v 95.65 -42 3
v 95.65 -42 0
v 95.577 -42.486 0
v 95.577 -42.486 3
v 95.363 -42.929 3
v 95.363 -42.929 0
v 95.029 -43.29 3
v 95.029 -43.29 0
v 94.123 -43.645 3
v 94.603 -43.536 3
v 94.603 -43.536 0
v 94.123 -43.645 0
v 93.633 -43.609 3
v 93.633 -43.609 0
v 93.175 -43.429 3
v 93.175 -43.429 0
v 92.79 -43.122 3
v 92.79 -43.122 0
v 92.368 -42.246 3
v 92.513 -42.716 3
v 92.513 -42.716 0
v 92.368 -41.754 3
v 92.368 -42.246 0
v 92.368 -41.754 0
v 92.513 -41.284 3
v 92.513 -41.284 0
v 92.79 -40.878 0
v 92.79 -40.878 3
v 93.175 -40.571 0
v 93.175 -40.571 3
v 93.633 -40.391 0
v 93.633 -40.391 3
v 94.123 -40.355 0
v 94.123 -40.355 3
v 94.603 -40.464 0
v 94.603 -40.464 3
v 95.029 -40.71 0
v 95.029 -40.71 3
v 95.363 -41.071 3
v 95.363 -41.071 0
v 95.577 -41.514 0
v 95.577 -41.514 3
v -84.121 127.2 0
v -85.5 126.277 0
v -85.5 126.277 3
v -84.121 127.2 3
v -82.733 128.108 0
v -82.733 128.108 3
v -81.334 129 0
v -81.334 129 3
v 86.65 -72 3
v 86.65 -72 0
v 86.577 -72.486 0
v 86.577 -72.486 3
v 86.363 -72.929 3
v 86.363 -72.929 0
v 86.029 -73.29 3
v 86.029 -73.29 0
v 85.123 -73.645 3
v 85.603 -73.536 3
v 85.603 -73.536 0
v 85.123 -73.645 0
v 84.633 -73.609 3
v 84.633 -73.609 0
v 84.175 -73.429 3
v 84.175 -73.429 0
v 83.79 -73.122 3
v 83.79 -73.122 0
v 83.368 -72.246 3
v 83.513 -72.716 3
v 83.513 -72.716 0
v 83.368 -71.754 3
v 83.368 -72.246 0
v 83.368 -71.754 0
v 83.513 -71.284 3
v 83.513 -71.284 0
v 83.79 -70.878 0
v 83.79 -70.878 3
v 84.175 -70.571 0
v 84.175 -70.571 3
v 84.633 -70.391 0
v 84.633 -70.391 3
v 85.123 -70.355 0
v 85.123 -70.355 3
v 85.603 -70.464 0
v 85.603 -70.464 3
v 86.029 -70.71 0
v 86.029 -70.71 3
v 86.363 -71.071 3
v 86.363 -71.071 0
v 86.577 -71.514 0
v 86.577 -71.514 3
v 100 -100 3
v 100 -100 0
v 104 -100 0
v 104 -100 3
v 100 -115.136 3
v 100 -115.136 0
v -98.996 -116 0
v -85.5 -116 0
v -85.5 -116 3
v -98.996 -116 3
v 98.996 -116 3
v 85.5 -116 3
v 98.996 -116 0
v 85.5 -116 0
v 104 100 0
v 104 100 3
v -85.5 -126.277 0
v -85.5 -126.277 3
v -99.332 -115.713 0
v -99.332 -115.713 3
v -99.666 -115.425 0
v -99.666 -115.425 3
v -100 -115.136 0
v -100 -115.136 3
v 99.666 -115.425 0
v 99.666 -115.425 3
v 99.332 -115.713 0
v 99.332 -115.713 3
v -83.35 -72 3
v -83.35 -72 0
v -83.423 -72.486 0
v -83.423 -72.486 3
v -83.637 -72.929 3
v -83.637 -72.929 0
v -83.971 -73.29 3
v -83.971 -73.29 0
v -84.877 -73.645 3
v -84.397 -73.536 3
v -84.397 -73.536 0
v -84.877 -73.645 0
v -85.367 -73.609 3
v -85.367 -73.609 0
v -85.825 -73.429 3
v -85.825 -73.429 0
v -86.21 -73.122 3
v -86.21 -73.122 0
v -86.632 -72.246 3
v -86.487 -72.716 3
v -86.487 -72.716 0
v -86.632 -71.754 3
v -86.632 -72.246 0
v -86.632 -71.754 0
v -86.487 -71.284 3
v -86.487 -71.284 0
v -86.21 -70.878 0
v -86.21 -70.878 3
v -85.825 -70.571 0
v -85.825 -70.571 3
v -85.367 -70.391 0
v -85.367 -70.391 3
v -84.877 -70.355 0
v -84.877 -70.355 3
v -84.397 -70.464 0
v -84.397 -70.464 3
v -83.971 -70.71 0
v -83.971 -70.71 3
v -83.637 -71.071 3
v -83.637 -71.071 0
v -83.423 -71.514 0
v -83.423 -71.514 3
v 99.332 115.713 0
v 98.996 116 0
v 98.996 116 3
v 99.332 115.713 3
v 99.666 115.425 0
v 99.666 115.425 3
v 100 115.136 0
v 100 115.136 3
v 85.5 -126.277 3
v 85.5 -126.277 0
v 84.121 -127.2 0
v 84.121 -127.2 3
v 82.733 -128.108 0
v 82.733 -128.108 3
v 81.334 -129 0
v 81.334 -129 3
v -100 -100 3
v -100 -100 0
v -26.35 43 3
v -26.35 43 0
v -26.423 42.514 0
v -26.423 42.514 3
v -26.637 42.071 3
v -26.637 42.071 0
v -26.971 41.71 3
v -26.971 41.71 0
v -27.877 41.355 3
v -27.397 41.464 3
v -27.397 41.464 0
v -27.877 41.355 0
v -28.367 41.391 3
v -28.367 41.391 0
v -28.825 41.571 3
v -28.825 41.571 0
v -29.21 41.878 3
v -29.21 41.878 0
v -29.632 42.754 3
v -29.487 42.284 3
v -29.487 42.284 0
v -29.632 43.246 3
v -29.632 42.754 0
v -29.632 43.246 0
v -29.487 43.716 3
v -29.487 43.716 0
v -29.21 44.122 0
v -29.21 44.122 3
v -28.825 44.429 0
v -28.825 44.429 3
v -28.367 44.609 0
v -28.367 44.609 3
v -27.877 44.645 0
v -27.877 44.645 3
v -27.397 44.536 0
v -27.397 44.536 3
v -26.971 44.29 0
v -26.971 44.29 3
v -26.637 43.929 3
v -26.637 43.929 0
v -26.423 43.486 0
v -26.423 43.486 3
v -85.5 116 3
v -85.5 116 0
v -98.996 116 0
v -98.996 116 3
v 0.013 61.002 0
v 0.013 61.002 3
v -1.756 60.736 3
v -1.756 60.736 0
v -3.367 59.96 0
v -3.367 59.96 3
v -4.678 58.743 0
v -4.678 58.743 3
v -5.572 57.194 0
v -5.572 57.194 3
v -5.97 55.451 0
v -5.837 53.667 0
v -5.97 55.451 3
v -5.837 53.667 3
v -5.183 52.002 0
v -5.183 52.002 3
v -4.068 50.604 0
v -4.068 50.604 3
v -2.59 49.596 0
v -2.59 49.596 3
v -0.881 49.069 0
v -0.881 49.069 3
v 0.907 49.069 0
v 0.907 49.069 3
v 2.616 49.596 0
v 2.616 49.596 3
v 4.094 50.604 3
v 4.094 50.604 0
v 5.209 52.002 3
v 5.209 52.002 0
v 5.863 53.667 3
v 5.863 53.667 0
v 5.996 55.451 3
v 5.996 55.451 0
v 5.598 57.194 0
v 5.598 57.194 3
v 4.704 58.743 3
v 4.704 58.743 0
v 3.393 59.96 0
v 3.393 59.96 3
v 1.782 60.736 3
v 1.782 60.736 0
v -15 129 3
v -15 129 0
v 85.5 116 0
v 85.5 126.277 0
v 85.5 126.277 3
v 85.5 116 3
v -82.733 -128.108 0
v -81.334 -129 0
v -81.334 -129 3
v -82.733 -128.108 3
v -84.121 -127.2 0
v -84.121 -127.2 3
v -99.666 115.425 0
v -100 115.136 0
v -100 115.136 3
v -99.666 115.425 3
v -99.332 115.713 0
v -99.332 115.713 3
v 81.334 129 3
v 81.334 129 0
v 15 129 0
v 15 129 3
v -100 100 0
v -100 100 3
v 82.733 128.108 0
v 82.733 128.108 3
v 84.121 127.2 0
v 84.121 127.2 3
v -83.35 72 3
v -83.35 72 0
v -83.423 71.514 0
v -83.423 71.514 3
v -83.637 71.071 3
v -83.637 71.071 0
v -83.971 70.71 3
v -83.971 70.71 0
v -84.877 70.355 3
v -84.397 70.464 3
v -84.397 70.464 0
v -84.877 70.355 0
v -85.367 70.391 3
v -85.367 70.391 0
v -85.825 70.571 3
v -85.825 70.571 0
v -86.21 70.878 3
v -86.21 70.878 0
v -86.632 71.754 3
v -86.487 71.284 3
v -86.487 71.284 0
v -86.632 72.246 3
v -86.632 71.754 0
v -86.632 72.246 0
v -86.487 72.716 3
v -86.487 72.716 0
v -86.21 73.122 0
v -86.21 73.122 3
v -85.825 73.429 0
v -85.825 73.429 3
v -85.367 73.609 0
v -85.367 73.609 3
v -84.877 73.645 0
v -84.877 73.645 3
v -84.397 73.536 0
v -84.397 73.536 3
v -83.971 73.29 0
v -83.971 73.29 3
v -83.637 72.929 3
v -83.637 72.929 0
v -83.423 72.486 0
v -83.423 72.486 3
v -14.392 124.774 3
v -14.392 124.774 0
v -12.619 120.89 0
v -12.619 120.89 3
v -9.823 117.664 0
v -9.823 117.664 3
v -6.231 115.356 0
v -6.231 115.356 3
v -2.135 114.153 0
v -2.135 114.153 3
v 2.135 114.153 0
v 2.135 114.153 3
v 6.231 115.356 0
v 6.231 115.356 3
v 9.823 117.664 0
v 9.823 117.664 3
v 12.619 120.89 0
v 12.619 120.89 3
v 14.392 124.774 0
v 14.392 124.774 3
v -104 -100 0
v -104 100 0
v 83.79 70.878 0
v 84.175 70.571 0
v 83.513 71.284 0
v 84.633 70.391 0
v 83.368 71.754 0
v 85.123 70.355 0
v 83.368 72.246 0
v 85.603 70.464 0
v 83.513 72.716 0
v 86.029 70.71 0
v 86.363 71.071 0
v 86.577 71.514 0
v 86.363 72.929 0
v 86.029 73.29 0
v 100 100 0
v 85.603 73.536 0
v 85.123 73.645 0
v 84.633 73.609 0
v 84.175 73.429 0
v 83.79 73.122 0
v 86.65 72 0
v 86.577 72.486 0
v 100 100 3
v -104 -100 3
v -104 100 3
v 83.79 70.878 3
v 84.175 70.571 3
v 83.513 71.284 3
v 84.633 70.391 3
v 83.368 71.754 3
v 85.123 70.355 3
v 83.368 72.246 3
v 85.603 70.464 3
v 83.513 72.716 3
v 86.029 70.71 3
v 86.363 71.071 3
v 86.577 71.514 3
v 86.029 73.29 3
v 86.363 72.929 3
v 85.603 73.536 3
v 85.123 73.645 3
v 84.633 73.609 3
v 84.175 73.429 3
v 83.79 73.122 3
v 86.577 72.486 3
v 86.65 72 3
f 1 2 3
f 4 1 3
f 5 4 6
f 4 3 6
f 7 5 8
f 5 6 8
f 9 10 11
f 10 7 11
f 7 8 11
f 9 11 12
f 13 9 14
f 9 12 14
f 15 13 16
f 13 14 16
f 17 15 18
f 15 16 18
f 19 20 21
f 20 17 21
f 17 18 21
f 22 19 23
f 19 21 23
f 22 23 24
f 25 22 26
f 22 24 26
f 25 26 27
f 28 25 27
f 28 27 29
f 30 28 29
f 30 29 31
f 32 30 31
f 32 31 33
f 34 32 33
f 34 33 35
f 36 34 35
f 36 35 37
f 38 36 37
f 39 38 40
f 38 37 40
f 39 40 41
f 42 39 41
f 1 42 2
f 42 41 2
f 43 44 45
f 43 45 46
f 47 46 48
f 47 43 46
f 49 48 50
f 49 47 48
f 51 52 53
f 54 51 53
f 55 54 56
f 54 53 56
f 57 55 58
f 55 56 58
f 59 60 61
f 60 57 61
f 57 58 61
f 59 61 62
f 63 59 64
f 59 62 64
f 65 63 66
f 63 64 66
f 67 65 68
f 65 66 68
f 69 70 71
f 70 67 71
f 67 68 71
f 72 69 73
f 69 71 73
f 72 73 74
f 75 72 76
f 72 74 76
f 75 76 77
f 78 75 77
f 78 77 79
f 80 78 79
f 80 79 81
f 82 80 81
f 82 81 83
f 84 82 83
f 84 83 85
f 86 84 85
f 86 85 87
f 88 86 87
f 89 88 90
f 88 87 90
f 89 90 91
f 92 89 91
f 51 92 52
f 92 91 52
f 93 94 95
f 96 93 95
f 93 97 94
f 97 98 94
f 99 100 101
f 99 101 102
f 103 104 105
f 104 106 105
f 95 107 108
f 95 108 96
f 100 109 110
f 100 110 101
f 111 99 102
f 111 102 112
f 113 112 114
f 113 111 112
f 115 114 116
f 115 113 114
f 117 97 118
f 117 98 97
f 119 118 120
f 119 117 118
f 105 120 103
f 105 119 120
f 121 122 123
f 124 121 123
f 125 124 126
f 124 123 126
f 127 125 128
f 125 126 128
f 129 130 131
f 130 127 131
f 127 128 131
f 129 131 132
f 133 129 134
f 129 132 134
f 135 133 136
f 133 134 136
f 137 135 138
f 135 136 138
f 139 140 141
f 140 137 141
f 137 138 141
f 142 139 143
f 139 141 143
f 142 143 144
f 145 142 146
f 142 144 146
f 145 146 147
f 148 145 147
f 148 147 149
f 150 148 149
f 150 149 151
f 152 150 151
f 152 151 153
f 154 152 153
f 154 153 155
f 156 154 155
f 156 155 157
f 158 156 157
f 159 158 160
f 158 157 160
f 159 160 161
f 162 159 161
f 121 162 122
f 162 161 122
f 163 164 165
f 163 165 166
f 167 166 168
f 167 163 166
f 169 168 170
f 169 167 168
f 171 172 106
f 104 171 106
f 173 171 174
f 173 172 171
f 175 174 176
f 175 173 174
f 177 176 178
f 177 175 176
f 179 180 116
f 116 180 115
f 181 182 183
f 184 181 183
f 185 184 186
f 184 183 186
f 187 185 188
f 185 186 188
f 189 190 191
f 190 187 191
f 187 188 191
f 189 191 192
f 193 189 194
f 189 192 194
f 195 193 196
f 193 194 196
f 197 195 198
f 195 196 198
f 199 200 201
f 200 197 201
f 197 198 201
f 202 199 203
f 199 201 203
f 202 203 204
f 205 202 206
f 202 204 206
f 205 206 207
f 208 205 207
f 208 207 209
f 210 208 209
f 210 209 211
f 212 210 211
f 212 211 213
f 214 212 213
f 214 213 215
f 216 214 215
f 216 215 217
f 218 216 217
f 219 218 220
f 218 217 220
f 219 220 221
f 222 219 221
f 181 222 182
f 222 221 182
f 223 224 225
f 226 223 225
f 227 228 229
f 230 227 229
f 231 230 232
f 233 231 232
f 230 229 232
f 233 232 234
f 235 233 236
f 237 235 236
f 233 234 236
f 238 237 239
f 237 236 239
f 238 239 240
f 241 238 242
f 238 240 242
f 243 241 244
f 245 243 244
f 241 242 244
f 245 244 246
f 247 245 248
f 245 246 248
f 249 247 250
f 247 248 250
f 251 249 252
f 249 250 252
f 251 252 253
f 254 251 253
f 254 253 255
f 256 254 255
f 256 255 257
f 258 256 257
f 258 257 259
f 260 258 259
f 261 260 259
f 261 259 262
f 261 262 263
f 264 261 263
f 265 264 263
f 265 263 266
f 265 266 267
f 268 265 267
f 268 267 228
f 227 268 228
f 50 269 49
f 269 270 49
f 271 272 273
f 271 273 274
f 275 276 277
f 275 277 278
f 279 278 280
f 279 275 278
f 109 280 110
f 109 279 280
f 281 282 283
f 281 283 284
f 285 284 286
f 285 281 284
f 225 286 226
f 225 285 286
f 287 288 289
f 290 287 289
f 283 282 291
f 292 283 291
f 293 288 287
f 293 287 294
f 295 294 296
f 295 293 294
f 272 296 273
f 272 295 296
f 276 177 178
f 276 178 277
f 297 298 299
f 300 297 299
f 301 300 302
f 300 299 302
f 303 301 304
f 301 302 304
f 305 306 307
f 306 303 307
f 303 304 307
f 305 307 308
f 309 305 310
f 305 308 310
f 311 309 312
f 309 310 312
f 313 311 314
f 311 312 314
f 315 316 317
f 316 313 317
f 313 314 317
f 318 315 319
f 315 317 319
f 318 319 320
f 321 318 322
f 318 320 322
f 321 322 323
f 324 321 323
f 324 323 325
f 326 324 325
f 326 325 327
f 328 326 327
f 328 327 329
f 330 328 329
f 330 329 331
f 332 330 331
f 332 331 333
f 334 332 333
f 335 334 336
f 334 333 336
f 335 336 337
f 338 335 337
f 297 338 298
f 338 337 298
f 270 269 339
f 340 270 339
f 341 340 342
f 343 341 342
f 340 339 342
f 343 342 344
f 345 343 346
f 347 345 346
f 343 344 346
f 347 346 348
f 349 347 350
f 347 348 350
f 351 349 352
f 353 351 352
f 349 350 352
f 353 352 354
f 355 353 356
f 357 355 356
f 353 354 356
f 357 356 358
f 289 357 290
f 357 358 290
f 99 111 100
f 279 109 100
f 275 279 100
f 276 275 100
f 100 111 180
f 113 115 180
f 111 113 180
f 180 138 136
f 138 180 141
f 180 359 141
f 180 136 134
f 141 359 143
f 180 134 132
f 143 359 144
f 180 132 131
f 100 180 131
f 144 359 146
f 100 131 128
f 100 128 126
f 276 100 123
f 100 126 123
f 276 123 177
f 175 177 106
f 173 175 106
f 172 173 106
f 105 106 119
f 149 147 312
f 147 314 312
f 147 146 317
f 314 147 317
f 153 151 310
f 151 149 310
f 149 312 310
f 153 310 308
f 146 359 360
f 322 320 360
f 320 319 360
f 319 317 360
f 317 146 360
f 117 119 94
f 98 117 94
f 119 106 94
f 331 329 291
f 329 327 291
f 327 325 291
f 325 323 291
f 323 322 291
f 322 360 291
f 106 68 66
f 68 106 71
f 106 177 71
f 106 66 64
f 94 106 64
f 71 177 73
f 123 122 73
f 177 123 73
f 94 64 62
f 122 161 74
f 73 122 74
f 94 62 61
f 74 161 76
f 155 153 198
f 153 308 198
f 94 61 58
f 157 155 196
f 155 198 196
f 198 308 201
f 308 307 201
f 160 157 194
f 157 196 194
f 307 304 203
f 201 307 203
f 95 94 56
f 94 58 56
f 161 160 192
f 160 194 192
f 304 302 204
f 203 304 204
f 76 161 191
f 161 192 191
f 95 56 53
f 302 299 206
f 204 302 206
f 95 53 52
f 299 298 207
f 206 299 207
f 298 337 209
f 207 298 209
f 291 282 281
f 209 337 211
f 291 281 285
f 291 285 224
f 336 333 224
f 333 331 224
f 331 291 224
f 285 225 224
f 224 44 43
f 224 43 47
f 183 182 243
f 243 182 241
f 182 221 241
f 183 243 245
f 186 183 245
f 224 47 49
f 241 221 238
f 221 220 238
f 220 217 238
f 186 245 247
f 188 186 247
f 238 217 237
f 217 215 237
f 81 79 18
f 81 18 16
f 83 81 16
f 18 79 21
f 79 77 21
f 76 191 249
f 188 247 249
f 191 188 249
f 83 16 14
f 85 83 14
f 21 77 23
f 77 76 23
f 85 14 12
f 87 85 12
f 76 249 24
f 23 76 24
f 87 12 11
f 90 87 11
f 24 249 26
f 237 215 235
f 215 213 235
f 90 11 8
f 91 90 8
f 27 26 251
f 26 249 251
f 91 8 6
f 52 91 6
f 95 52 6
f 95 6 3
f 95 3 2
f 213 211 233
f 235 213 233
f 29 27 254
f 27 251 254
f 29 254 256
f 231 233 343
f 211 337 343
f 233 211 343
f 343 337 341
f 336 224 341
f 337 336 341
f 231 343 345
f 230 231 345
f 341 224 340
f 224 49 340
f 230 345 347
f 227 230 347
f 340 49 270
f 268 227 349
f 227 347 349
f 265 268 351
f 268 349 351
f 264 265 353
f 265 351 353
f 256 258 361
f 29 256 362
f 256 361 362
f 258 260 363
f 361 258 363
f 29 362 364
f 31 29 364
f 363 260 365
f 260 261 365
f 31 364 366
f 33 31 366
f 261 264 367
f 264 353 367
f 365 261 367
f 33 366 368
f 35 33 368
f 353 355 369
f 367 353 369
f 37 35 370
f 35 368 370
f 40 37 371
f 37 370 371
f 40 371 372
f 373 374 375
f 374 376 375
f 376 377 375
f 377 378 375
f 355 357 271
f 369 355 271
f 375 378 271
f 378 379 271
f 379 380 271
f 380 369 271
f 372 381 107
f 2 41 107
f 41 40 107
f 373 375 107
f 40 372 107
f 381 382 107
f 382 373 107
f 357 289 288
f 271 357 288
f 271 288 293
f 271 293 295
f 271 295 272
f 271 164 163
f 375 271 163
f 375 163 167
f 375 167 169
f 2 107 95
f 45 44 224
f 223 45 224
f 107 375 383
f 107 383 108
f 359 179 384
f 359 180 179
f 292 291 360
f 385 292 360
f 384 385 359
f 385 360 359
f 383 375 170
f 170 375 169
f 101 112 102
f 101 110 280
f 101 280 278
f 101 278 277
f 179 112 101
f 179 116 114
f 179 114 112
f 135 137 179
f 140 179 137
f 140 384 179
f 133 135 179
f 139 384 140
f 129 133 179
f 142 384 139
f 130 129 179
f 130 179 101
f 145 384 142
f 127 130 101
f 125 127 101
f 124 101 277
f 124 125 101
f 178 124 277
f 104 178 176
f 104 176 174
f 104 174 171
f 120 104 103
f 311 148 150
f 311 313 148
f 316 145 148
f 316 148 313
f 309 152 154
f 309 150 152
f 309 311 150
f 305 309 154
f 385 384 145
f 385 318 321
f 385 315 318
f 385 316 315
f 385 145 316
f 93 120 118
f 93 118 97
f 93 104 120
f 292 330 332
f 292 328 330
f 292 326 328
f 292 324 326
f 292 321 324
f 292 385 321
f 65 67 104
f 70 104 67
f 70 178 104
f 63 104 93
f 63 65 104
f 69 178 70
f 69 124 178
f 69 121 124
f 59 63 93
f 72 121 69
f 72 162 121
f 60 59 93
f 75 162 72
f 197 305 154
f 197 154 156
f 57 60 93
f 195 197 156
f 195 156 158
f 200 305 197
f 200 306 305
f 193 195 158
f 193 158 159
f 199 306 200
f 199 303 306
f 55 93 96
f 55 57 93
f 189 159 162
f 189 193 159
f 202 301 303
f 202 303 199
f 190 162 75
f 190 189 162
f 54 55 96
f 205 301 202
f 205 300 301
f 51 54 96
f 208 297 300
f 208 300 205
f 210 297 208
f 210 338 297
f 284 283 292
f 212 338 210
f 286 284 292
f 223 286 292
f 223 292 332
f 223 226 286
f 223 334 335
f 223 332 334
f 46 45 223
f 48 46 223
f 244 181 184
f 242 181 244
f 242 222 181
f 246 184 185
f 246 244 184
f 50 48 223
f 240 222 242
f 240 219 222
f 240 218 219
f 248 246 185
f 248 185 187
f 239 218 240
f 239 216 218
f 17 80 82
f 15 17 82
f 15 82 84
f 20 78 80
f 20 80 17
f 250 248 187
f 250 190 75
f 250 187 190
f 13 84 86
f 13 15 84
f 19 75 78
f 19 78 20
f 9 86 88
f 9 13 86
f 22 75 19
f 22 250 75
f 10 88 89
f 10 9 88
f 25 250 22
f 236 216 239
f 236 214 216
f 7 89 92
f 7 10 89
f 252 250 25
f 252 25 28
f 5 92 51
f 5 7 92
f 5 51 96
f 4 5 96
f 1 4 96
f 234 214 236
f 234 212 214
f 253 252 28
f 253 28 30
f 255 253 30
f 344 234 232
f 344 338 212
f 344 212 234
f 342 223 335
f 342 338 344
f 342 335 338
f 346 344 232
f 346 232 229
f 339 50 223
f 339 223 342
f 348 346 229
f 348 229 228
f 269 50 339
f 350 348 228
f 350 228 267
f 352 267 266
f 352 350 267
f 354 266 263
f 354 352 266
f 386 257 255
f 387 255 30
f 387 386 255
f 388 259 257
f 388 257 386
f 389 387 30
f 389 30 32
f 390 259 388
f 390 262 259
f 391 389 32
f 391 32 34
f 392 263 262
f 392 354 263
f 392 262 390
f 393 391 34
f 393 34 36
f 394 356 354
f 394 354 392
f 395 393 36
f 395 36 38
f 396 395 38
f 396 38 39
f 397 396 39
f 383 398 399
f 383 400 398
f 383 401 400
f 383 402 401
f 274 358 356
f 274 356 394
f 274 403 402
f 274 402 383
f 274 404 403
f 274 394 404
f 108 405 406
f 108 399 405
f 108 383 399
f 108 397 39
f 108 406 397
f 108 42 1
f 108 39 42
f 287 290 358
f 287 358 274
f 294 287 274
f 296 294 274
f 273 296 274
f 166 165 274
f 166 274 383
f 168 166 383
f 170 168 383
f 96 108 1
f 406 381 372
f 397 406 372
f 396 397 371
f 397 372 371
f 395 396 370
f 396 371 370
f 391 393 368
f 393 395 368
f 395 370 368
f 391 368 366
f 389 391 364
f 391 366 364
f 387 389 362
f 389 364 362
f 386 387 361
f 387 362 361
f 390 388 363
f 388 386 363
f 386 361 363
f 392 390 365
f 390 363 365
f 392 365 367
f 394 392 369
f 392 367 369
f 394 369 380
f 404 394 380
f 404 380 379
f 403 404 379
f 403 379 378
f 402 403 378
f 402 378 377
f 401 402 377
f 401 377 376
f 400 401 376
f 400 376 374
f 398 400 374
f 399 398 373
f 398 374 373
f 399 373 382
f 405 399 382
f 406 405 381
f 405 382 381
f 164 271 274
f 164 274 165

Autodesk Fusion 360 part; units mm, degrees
sketch "Sketch1" plane through (0, 0, 0) normal (0, 0, 1) x (1, 0, 0)
  line L0 (100, 125) -> (-100, 125)
  line L1 (-100, 125) -> (-100, -125)
  line L2 (-100, -125) -> (100, -125)
  line L3 (100, -125) -> (100, 125)
  line L4 (100, 125) -> (-100, -125) construction
  line L5 (-100, 125) -> (100, -125) construction
  line L6 (-100, 125) -> (100, 125)
  line L7 (100, 125) -> (100, 129)
  line L8 (100, 129) -> (-100, 129)
  line L9 (-100, 129) -> (-100, 125)
  line L10 (-100, -125) -> (100, -125)
  line L11 (100, -125) -> (100, -129)
  line L12 (100, -129) -> (-100, -129)
  line L13 (-100, -129) -> (-100, -125)
  line L14 (100, 125) -> (104, 125)
  line L15 (104, 125) -> (104, -125)
  line L16 (104, -125) -> (100, -125)
  line L17 (100, -125) -> (100, 125)
  line L18 (-100, 125) -> (-104, 125)
  line L19 (-104, 125) -> (-104, -125)
  line L20 (-104, -125) -> (-100, -125)
  line L21 (-100, -125) -> (-100, 125)
  line L22 (-80, -53.8) -> (-80, 2.2) construction
  circle A0 centre (-80, -53.8) radius 1.65 construction
  circle A1 centre (-80, 2.2) radius 1.65 construction
  line L23 (-61.0622, -1) -> (-98.9378, -1) construction
  line L24 (-98.9378, -1) -> (-98.9378, -50.6) construction
  line L25 (-98.9378, -50.6) -> (-61.0622, -50.6) construction
  line L26 (-61.0622, -50.6) -> (-61.0622, -1) construction
  line L27 (-61.0622, -1) -> (-98.9378, -50.6) construction
  line L28 (-98.9378, -1) -> (-61.0622, -50.6) construction
  line L29 (-30.5, 49.5) -> (98.5, 49.5) construction
  line L30 (98.5, 49.5) -> (98.5, -47.5) construction
  line L31 (98.5, -47.5) -> (-30.5, -47.5) construction
  line L32 (-30.5, -47.5) -> (-30.5, 49.5) construction
  circle A2 centre (-28, 43) radius 1.65
  circle A3 centre (94, -42) radius 1.65
  line L33 (-100, 125) -> (-85.5, 125)
  line L34 (-85.5, 125) -> (-85.5, 116)
  line L35 (-85.5, 116) -> (-100, 116)
  line L36 (-100, 116) -> (-100, 125)
  line L37 (100, 125) -> (85.5, 125)
  line L38 (85.5, 125) -> (85.5, 116)
  line L39 (85.5, 116) -> (100, 116)
  line L40 (100, 116) -> (100, 125)
  line L41 (-100, -125) -> (-85.5, -125)
  line L42 (-85.5, -125) -> (-85.5, -116)
  line L43 (-85.5, -116) -> (-100, -116)
  line L44 (-100, -116) -> (-100, -125)
  line L45 (100, -125) -> (85.5, -125)
  line L46 (85.5, -125) -> (85.5, -116)
  line L47 (85.5, -116) -> (100, -116)
  line L48 (100, -116) -> (100, -125)
  line L49 (-100, 100) -> (-104, 100)
  line L50 (100, 100) -> (104, 100)
  line L51 (-100, -100) -> (-104, -100)
  line L52 (100, -100) -> (104, -100)
  line L53 (-85.5, 125) -> (-85.5, 129)
  line L54 (85.5, 125) -> (85.5, 129)
  line L55 (-85.5, -125) -> (-85.5, -129)
  line L56 (85.5, -125) -> (85.5, -129)
  line L57 (-115, -140) -> (-75, -140) construction
  line L58 (-75, -140) -> (-75, -87) construction
  line L59 (-75, -87) -> (-115, -87) construction
  line L60 (-115, -87) -> (-115, -140) construction
  line L61 (-63.3606, -140) -> (-21.3606, -140) construction
  line L62 (-21.3606, -140) -> (-21.3606, -53.8) construction
  line L63 (-21.3606, -53.8) -> (-63.3606, -53.8) construction
  line L64 (-63.3606, -53.8) -> (-63.3606, -140) construction
  line L65 (-100, 0) -> (-118.2487, 0) construction
  circle A4 centre (0, 0) radius 152.5
  circle A5 centre (-85, -72) radius 1.65
  line L66 (-85, -72) -> (85, -72) construction
  line L67 (85, -72) -> (85, 72) construction
  line L68 (85, 72) -> (-85, 72) construction
  line L69 (-85, 72) -> (-85, -72) construction
  circle A6 centre (85, 72) radius 1.65
  circle A7 centre (85, -72) radius 1.65
  circle A8 centre (-85, 72) radius 1.65
  point P0 (-80, -25.8)
  dimension "d1" = 200
  dimension "d2" = 250
  dimension "d3" = 4
  dimension "d4" = 4
  dimension "d5" = 4
  dimension "d6" = 4
  dimension "d7" = 20
  dimension "d8" = 56
  dimension "d10" = 3.3
  dimension "d11" = 37.8755
  dimension "d12" = 49.6
  dimension "d13" = 2.5
  dimension "d14" = 6.5
  dimension "d15" = 3.3
  dimension "d16" = 5.5
  dimension "d17" = 4.5
  dimension "d18" = 129
  dimension "d19" = 97
  dimension "d20" = 1.5
  dimension "d21" = 14.5
  dimension "d22" = 9
  dimension "d23" = 14.5
  dimension "d24" = 9
  dimension "d25" = 14.5
  dimension "d26" = 14.5
  dimension "d27" = 9
  dimension "d28" = 9
  dimension "d29" = 25
  dimension "d30" = 25
  dimension "d31" = 25
  dimension "d32" = 25
  dimension "d33" = 40
  dimension "d34" = 53
  dimension "d35" = 15
  dimension "d36" = 15
  dimension "d37" = 3.3
  dimension "d38" = 86.2
  dimension "d39" = 42
  dimension "d40" = 1
  dimension "d50" = 305
  dimension "d51" = 3.3
  dimension "d52" = 15
  dimension "d53" = 15
  dimension "d54" = 15
  dimension "d55" = 53
  dimension "d56" = 53
  dimension "d57" = 170
  dimension "d58" = 144
  dimension "d60" = 47.5
  dimension "d61" = 49.5
extrude "Extrude1" add sketch "Sketch1" along normal blind 3 contours L0 L1 L2 L3 L6 L10 L17 L21 L34 L35 L38 L39 L42 L43 L46 L47 A4 | L0 L6 L8 L53 L54 A4 | L3 L15 L17 L50 L52 | L1 L19 L21 L49 L51 | L2 L10 L12 L55 L56 A4
hole "Hole1" at (0, 129, 0) direction (0, 0, 1) diameter 30 depth 10 tip angle 118
hole "Hole2" at (0.013, 55.0023, 0) direction (0, 0, 1) diameter 12 depth 10 tip angle 118
fillet "Fillet1" [suppressed]
fillet "Fillet2" [suppressed]
chamfer "Chamfer1" [suppressed]
fillet "Fillet3" [suppressed]
equation "d4 = d3"
equation "d5 = d3"
equation "d6 = d3"
equation "d23 = d21"
equation "d24 = d22"
equation "d25 = d21"
equation "d26 = d25"
equation "d27 = d22"
equation "d28 = d24"
equation "d30 = d29"
equation "d31 = d29"
equation "d32 = d29"
equation "d36 = d35"
equation "d60 = d19 / 2 - 1 mm"
